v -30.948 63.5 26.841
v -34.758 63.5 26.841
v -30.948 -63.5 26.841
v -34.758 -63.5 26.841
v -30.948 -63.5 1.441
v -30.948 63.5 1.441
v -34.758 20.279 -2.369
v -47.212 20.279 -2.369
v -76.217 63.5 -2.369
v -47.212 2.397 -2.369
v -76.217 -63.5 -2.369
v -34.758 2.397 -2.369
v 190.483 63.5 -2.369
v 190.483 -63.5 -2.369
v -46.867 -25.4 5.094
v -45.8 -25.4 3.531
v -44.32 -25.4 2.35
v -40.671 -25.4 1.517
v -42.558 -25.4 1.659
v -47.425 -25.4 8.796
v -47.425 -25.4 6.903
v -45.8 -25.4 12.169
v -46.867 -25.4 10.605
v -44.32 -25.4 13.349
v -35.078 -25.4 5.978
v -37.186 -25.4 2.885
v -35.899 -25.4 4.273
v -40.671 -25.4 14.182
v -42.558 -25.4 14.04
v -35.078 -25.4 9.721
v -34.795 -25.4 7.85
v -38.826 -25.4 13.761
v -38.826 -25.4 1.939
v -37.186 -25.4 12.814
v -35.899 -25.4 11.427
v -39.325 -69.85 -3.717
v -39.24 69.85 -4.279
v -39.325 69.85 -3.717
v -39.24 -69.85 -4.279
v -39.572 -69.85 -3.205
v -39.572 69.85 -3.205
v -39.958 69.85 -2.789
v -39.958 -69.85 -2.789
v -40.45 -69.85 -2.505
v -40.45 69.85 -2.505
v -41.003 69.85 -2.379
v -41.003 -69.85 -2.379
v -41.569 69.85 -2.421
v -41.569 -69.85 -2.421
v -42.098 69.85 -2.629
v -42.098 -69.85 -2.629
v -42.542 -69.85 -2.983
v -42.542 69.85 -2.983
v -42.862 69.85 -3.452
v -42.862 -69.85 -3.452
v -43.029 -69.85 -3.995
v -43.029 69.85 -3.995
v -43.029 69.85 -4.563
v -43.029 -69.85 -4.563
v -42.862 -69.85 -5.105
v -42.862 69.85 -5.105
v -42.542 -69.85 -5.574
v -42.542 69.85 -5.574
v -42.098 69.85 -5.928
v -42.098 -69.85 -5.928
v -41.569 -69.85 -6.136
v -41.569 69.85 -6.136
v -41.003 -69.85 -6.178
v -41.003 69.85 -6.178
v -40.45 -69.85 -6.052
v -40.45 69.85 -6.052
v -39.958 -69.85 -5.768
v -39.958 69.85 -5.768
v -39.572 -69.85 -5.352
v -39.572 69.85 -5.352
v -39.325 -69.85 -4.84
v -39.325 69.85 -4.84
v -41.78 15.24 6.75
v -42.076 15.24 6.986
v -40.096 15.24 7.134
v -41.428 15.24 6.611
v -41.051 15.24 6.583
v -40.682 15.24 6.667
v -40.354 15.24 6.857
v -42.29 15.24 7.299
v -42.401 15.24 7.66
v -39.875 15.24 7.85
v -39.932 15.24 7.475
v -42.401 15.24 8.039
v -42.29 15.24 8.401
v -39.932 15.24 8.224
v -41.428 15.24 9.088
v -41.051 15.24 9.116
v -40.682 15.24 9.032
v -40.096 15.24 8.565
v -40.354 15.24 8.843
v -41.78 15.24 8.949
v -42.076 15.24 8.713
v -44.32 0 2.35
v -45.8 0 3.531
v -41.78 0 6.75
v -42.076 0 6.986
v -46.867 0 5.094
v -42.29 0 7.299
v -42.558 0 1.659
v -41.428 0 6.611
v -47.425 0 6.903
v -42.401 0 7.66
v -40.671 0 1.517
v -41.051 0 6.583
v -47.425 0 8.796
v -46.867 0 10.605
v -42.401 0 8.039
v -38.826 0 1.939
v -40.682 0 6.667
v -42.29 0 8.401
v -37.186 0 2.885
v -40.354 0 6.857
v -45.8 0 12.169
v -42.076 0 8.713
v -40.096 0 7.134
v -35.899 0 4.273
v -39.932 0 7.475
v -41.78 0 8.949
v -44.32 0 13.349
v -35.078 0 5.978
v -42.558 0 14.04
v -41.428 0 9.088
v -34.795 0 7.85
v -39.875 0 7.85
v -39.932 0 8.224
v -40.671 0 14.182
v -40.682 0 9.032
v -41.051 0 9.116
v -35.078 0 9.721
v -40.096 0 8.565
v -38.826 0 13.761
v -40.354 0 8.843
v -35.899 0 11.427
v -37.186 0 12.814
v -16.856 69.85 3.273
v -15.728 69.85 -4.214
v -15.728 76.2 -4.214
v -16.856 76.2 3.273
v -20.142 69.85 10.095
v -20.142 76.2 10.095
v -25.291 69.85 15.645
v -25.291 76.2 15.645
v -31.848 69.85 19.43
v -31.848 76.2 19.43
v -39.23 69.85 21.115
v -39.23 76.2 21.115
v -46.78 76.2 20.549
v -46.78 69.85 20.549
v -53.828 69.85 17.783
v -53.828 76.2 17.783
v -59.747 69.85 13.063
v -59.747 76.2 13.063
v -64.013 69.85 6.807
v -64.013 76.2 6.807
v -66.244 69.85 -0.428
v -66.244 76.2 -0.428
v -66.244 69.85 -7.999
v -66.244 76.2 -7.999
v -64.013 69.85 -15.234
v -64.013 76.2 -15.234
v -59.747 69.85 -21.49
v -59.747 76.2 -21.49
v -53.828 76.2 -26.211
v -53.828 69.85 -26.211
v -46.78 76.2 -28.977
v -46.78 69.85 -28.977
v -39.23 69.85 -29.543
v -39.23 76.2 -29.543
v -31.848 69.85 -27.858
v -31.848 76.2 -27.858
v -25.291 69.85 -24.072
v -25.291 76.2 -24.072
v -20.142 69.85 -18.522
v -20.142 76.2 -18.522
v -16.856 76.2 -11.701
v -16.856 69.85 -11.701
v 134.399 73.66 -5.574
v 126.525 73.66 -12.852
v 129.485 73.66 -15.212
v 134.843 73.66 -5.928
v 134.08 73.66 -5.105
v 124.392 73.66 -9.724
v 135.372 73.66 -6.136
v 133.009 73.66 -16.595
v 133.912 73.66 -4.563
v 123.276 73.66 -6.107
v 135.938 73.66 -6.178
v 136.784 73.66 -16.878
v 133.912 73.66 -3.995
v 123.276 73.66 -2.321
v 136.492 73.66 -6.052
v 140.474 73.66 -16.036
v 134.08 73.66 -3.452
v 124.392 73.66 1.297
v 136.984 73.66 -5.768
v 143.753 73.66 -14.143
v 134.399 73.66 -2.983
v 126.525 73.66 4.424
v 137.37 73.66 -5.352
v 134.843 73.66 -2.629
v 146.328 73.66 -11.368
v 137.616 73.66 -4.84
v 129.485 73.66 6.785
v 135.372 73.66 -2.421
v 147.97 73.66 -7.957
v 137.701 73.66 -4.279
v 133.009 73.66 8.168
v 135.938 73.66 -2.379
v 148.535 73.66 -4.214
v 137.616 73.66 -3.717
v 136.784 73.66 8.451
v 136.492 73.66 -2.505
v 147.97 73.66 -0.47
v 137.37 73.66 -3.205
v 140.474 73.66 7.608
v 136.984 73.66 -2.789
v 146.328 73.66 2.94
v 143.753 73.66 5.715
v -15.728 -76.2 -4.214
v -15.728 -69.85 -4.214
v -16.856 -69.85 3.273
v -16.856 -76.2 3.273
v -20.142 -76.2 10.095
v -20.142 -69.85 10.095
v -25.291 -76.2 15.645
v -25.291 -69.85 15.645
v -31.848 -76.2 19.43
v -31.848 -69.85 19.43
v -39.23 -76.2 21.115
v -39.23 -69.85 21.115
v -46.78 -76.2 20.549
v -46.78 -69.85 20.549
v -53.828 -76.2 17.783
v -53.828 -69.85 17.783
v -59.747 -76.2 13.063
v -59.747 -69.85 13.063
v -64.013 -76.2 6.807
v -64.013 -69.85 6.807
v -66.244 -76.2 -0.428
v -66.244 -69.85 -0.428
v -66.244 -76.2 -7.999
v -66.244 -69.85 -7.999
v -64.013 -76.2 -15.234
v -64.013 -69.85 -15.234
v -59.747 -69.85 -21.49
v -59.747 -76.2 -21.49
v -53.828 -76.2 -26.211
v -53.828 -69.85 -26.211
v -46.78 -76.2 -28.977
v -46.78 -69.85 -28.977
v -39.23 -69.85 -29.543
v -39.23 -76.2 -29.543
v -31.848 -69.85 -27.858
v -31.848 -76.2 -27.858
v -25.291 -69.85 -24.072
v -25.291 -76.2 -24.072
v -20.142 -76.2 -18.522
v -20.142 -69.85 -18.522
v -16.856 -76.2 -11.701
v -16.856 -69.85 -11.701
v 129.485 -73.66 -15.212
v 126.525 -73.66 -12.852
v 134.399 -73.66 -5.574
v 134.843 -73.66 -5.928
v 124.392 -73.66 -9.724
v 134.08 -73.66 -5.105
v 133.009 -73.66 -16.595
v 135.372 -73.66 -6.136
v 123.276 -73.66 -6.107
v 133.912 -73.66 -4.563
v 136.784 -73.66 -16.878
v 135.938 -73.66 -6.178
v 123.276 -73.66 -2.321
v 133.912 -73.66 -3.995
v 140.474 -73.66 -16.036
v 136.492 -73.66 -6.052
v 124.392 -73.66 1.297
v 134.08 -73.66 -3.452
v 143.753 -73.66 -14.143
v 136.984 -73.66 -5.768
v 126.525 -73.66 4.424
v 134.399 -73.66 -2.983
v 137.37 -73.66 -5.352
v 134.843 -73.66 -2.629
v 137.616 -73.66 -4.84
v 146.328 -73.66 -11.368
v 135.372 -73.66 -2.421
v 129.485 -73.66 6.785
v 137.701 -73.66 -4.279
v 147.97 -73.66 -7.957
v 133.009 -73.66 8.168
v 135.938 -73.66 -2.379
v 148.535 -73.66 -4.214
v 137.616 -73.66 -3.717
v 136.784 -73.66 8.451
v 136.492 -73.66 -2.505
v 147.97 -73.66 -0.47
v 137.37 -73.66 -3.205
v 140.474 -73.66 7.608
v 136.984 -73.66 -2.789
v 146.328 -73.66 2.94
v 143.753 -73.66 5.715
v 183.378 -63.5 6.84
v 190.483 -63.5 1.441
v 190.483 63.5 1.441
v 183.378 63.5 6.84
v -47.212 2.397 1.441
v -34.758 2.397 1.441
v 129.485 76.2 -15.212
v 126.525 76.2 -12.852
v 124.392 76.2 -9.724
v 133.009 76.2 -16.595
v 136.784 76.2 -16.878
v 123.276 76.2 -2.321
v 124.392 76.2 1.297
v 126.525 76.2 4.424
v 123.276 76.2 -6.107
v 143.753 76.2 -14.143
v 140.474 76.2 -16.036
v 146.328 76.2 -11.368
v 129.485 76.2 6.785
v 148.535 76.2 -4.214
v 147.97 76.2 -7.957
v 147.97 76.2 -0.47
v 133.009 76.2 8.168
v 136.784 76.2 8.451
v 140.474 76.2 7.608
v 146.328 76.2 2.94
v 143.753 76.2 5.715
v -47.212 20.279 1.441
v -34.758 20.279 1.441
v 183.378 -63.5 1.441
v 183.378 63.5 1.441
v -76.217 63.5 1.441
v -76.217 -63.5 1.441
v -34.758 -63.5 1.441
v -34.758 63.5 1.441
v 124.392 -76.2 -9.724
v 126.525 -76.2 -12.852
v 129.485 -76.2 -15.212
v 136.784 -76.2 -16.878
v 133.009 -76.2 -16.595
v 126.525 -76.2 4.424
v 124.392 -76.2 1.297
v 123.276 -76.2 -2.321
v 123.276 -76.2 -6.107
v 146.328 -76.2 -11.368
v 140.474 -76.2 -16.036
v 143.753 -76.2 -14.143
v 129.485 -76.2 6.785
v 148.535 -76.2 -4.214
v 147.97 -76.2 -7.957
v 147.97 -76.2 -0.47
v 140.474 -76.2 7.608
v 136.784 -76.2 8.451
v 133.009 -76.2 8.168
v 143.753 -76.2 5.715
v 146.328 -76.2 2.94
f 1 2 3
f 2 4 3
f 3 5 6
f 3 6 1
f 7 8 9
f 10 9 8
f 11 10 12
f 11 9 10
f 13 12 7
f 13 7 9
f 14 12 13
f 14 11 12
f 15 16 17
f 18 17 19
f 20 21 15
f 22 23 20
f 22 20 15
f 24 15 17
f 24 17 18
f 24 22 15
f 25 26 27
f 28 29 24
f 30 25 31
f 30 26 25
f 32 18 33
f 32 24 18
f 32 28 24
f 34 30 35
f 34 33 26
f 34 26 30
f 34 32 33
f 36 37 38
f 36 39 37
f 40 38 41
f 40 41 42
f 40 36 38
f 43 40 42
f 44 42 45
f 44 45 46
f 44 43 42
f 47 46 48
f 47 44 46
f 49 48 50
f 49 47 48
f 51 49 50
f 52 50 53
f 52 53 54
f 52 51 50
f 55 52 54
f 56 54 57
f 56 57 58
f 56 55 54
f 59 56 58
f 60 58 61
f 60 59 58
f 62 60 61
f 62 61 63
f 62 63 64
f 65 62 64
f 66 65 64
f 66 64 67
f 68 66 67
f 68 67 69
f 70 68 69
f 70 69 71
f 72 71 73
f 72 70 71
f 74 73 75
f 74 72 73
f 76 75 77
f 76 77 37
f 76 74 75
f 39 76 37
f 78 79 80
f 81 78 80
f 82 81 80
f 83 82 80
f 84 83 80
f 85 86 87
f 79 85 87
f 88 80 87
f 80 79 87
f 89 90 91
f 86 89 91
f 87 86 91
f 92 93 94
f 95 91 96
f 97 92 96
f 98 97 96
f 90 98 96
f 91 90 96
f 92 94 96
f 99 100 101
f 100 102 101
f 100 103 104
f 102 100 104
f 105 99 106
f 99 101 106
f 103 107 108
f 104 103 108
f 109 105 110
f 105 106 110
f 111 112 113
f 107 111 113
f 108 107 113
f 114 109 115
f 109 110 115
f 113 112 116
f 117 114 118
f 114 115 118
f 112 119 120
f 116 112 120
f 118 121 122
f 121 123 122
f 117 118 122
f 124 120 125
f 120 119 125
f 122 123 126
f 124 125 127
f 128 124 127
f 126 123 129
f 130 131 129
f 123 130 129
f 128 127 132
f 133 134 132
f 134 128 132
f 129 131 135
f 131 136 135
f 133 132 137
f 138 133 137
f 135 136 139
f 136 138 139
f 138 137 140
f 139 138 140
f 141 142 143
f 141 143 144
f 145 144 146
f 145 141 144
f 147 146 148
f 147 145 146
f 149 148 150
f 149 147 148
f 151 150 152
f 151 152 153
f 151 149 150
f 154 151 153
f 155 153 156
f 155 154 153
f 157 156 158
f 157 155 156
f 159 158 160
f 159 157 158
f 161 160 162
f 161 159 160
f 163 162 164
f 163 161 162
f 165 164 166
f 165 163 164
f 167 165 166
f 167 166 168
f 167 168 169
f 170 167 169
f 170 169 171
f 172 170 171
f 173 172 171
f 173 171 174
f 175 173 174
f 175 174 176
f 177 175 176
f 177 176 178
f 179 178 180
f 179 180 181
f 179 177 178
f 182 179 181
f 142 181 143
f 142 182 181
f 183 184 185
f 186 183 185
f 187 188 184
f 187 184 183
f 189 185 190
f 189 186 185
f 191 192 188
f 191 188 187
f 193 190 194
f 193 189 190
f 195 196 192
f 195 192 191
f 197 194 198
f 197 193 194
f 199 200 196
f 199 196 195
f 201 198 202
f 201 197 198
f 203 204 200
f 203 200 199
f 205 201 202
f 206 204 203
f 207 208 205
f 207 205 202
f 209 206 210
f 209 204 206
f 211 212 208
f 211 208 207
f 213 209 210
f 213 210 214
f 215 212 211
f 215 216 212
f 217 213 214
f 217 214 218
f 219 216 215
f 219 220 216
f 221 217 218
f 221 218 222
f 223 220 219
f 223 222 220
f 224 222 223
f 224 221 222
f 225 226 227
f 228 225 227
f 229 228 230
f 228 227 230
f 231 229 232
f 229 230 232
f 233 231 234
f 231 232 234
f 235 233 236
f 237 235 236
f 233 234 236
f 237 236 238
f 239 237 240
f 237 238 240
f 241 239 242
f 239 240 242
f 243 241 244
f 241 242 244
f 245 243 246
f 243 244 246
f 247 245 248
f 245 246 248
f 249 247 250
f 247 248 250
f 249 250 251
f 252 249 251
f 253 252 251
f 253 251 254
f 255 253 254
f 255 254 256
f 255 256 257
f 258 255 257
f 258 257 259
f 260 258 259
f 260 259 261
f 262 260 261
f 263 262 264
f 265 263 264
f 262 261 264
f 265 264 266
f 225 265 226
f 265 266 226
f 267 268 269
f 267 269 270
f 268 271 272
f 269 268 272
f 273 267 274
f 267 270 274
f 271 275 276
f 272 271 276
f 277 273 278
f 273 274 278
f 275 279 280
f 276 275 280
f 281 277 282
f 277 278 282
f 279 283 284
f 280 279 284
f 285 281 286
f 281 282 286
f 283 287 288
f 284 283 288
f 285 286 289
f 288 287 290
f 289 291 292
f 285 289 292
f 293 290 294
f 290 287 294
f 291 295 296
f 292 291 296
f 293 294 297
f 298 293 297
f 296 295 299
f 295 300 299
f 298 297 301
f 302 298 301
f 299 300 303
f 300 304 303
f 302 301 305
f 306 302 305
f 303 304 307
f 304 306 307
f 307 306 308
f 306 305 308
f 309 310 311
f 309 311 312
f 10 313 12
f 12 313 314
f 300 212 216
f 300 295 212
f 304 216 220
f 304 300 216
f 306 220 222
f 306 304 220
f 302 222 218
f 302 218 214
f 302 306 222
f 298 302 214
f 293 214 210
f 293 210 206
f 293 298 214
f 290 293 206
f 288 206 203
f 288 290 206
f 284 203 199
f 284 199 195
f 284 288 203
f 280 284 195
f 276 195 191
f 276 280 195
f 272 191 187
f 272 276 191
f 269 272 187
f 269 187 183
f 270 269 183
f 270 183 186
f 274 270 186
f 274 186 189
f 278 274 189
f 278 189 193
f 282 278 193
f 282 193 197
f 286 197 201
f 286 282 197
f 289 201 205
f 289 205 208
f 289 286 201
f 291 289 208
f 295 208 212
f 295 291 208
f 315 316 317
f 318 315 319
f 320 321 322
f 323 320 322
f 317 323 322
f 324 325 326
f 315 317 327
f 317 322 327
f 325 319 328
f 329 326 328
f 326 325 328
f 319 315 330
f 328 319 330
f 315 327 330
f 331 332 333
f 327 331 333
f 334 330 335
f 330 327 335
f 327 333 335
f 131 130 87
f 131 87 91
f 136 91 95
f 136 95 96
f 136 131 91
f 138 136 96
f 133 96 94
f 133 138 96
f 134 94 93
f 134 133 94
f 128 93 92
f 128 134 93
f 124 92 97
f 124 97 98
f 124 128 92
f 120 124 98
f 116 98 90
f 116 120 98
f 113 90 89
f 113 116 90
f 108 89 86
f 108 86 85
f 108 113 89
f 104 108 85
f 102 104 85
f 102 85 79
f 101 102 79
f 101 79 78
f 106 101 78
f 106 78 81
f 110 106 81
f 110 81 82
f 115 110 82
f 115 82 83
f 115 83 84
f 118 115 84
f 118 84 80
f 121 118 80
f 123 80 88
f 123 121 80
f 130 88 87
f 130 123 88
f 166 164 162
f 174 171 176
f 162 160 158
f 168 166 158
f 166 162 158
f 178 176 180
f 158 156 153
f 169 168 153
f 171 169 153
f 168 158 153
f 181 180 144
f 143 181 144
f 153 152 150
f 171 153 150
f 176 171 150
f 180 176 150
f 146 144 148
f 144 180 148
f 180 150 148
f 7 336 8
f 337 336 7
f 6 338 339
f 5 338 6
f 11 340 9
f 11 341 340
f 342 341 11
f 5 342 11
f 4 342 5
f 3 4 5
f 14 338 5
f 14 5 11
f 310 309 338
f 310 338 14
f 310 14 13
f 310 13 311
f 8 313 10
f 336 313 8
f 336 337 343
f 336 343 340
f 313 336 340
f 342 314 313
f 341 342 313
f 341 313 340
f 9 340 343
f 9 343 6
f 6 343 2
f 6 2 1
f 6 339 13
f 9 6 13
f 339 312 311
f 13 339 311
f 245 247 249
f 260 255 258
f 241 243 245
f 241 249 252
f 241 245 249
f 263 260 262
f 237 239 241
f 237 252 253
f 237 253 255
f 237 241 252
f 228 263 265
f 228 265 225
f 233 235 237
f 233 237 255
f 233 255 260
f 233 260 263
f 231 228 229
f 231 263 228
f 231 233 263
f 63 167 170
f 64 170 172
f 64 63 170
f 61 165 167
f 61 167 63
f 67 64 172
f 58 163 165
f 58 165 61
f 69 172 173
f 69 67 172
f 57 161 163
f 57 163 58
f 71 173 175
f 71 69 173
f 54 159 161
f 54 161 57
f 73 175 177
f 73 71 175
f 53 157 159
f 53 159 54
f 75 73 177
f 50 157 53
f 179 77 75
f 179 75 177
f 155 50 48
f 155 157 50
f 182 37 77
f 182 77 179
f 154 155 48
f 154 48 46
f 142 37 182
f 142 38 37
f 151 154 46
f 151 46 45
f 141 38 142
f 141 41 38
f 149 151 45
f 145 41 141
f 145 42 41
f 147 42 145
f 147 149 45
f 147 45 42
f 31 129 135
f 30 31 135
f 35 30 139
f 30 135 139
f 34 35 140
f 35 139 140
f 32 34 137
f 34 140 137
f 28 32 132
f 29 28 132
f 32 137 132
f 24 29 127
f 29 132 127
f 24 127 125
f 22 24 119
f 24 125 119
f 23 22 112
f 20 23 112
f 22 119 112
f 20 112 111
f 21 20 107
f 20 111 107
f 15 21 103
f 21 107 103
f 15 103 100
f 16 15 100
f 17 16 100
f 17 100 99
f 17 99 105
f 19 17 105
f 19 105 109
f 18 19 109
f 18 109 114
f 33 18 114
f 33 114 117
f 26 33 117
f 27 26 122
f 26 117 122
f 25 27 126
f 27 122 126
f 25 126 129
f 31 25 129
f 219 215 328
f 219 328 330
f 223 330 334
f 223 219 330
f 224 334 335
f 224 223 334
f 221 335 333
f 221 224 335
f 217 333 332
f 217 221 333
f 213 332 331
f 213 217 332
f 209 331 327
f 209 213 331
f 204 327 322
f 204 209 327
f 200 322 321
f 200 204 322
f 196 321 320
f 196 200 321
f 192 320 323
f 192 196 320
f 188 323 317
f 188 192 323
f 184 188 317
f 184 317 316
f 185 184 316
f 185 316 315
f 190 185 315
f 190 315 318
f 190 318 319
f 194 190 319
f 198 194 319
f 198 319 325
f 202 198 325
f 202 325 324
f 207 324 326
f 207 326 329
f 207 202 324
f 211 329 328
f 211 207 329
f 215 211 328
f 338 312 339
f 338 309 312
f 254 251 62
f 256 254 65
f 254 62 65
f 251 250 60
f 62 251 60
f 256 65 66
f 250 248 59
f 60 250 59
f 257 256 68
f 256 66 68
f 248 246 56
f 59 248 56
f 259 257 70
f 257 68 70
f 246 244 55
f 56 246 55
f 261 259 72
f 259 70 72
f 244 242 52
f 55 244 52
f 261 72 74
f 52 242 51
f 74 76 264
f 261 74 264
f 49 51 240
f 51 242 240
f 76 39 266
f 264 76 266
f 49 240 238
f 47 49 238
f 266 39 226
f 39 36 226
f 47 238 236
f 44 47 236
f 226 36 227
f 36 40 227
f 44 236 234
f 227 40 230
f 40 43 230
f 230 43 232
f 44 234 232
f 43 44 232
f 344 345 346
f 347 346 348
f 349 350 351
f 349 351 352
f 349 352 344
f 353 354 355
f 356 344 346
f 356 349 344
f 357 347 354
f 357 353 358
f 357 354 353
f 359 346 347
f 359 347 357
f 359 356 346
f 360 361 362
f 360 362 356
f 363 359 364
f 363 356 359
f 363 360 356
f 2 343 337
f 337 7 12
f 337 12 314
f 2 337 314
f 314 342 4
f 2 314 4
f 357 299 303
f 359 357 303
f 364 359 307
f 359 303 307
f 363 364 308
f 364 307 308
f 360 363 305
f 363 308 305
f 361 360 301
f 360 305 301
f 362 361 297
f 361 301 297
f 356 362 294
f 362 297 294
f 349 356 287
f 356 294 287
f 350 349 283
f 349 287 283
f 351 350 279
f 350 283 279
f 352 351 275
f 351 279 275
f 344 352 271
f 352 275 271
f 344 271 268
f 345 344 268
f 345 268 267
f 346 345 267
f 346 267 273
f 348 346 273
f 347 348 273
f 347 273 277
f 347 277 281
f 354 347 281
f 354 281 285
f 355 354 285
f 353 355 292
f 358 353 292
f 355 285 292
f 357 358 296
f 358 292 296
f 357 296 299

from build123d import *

# Parameters (mm, degrees)
F0_W      = 3.81
F0_H      = 25.4
F1_DEPTH  = 63.5
F0_R      = 1.905
F2_DEPTH  = 76.2
F4_START  = 69.85
F3_R      = 25.4
F4_DEPTH  = 6.35
F5_START  = 73.66
F3_R_2    = 12.7
F5_DEPTH  = 2.54
F6_START  = -73.66
F6_DEPTH  = 2.54
F7_START  = -69.85
F7_DEPTH  = 6.35
F8_DEPTH  = 63.5
F9_W      = 12.4537762487
F9_H      = 17.8824202158
F10_DEPTH = 25.4
F0_R_2    = 1.27
F11_DEPTH = 15.24
F0_R_3    = 6.35
F12_DEPTH = 25.4


with BuildPart() as f1:
    # F0 (on Front) → F1 (new body, symmetric)
    with BuildSketch(Plane.XZ):
        Polygon((-76.2167557975, 1.44113655), (-76.2167557975, -2.36886345), (190.4832442025, -2.36886345), (190.4832442025, 1.44113655), (183.3781301975, 1.44113655), (-30.9478223562, 1.44113655), (-34.7578223562, 1.44113655), align=None)
        with Locations((-32.8528223562, 14.14113655)):
            Rectangle(F0_W, F0_H)
    extrude(amount=F1_DEPTH, both=True)

    # F0 (on Front) → F8 (join, symmetric)
    with BuildSketch(Plane.XZ):
        Polygon((183.3781301975, 1.44113655), (190.4832442025, 1.44113655), (183.3781301975, 6.8395356648), align=None)
    extrude(amount=F8_DEPTH, both=True)

    # F9 (on face) → F10 (cut)
    with BuildSketch(Plane.XY.offset(1.44113655)):
        with Locations((-40.9847104806, 11.3378230017)):
            Rectangle(F9_W, F9_H)
    extrude(amount=-F10_DEPTH, mode=Mode.SUBTRACT)


with BuildPart() as f2:
    # F0 (on Front) → F2 (new body, symmetric)
    with BuildSketch(Plane.XZ):
        with Locations((-41.1454886198, -4.27858904)):
            Circle(F0_R)
    extrude(amount=F2_DEPTH, both=True)

    # F3 (on Front) → F4 (join)
    with BuildSketch(Plane.XZ.offset(F4_START)):
        with Locations((-41.1279797554, -4.2137699202)):
            Circle(F3_R)
    extrude(amount=F4_DEPTH)

    # F3 (on Front) → F7 (join)
    with BuildSketch(Plane.XZ.offset(F7_START)):
        with Locations((-41.1279797554, -4.2137699202)):
            Circle(F3_R)
    extrude(amount=-F7_DEPTH)


with BuildPart() as f2b:
    # F0 (on Front) → F2, piece 2 (new body, symmetric)
    with BuildSketch(Plane.XZ):
        with Locations((135.7958912849, -4.27858904)):
            Circle(F0_R)
    extrude(amount=F2_DEPTH, both=True)

    # F3 (on Front) → F5 (join)
    with BuildSketch(Plane.XZ.offset(F5_START)):
        with Locations((135.8346194029, -4.2137699202)):
            Circle(F3_R_2)
    extrude(amount=F5_DEPTH)

    # F3 (on Front) → F6 (join)
    with BuildSketch(Plane.XZ.offset(F6_START)):
        with Locations((135.8346194029, -4.2137699202)):
            Circle(F3_R_2)
    extrude(amount=-F6_DEPTH)


with BuildPart() as f11:
    # F0 (on Front) → F11 (new body)
    with BuildSketch(Plane.XZ):
        with Locations((-41.1454886198, 7.8496225178)):
            Circle(F0_R_2)
    extrude(amount=-F11_DEPTH)

    # F0 (on Front) → F12 (join)
    with BuildSketch(Plane.XZ):
        with Locations((-41.1454886198, 7.8496225178)):
            Circle(F0_R_3)
        with Locations((-41.1454886198, 7.8496225178)):
            Circle(F0_R_2, mode=Mode.SUBTRACT)
        with Locations((-41.1454886198, 7.8496225178)):
            Circle(F0_R_2)
    extrude(amount=F12_DEPTH)


solid = Compound([f1.part, f2.part, f2b.part, f11.part])
